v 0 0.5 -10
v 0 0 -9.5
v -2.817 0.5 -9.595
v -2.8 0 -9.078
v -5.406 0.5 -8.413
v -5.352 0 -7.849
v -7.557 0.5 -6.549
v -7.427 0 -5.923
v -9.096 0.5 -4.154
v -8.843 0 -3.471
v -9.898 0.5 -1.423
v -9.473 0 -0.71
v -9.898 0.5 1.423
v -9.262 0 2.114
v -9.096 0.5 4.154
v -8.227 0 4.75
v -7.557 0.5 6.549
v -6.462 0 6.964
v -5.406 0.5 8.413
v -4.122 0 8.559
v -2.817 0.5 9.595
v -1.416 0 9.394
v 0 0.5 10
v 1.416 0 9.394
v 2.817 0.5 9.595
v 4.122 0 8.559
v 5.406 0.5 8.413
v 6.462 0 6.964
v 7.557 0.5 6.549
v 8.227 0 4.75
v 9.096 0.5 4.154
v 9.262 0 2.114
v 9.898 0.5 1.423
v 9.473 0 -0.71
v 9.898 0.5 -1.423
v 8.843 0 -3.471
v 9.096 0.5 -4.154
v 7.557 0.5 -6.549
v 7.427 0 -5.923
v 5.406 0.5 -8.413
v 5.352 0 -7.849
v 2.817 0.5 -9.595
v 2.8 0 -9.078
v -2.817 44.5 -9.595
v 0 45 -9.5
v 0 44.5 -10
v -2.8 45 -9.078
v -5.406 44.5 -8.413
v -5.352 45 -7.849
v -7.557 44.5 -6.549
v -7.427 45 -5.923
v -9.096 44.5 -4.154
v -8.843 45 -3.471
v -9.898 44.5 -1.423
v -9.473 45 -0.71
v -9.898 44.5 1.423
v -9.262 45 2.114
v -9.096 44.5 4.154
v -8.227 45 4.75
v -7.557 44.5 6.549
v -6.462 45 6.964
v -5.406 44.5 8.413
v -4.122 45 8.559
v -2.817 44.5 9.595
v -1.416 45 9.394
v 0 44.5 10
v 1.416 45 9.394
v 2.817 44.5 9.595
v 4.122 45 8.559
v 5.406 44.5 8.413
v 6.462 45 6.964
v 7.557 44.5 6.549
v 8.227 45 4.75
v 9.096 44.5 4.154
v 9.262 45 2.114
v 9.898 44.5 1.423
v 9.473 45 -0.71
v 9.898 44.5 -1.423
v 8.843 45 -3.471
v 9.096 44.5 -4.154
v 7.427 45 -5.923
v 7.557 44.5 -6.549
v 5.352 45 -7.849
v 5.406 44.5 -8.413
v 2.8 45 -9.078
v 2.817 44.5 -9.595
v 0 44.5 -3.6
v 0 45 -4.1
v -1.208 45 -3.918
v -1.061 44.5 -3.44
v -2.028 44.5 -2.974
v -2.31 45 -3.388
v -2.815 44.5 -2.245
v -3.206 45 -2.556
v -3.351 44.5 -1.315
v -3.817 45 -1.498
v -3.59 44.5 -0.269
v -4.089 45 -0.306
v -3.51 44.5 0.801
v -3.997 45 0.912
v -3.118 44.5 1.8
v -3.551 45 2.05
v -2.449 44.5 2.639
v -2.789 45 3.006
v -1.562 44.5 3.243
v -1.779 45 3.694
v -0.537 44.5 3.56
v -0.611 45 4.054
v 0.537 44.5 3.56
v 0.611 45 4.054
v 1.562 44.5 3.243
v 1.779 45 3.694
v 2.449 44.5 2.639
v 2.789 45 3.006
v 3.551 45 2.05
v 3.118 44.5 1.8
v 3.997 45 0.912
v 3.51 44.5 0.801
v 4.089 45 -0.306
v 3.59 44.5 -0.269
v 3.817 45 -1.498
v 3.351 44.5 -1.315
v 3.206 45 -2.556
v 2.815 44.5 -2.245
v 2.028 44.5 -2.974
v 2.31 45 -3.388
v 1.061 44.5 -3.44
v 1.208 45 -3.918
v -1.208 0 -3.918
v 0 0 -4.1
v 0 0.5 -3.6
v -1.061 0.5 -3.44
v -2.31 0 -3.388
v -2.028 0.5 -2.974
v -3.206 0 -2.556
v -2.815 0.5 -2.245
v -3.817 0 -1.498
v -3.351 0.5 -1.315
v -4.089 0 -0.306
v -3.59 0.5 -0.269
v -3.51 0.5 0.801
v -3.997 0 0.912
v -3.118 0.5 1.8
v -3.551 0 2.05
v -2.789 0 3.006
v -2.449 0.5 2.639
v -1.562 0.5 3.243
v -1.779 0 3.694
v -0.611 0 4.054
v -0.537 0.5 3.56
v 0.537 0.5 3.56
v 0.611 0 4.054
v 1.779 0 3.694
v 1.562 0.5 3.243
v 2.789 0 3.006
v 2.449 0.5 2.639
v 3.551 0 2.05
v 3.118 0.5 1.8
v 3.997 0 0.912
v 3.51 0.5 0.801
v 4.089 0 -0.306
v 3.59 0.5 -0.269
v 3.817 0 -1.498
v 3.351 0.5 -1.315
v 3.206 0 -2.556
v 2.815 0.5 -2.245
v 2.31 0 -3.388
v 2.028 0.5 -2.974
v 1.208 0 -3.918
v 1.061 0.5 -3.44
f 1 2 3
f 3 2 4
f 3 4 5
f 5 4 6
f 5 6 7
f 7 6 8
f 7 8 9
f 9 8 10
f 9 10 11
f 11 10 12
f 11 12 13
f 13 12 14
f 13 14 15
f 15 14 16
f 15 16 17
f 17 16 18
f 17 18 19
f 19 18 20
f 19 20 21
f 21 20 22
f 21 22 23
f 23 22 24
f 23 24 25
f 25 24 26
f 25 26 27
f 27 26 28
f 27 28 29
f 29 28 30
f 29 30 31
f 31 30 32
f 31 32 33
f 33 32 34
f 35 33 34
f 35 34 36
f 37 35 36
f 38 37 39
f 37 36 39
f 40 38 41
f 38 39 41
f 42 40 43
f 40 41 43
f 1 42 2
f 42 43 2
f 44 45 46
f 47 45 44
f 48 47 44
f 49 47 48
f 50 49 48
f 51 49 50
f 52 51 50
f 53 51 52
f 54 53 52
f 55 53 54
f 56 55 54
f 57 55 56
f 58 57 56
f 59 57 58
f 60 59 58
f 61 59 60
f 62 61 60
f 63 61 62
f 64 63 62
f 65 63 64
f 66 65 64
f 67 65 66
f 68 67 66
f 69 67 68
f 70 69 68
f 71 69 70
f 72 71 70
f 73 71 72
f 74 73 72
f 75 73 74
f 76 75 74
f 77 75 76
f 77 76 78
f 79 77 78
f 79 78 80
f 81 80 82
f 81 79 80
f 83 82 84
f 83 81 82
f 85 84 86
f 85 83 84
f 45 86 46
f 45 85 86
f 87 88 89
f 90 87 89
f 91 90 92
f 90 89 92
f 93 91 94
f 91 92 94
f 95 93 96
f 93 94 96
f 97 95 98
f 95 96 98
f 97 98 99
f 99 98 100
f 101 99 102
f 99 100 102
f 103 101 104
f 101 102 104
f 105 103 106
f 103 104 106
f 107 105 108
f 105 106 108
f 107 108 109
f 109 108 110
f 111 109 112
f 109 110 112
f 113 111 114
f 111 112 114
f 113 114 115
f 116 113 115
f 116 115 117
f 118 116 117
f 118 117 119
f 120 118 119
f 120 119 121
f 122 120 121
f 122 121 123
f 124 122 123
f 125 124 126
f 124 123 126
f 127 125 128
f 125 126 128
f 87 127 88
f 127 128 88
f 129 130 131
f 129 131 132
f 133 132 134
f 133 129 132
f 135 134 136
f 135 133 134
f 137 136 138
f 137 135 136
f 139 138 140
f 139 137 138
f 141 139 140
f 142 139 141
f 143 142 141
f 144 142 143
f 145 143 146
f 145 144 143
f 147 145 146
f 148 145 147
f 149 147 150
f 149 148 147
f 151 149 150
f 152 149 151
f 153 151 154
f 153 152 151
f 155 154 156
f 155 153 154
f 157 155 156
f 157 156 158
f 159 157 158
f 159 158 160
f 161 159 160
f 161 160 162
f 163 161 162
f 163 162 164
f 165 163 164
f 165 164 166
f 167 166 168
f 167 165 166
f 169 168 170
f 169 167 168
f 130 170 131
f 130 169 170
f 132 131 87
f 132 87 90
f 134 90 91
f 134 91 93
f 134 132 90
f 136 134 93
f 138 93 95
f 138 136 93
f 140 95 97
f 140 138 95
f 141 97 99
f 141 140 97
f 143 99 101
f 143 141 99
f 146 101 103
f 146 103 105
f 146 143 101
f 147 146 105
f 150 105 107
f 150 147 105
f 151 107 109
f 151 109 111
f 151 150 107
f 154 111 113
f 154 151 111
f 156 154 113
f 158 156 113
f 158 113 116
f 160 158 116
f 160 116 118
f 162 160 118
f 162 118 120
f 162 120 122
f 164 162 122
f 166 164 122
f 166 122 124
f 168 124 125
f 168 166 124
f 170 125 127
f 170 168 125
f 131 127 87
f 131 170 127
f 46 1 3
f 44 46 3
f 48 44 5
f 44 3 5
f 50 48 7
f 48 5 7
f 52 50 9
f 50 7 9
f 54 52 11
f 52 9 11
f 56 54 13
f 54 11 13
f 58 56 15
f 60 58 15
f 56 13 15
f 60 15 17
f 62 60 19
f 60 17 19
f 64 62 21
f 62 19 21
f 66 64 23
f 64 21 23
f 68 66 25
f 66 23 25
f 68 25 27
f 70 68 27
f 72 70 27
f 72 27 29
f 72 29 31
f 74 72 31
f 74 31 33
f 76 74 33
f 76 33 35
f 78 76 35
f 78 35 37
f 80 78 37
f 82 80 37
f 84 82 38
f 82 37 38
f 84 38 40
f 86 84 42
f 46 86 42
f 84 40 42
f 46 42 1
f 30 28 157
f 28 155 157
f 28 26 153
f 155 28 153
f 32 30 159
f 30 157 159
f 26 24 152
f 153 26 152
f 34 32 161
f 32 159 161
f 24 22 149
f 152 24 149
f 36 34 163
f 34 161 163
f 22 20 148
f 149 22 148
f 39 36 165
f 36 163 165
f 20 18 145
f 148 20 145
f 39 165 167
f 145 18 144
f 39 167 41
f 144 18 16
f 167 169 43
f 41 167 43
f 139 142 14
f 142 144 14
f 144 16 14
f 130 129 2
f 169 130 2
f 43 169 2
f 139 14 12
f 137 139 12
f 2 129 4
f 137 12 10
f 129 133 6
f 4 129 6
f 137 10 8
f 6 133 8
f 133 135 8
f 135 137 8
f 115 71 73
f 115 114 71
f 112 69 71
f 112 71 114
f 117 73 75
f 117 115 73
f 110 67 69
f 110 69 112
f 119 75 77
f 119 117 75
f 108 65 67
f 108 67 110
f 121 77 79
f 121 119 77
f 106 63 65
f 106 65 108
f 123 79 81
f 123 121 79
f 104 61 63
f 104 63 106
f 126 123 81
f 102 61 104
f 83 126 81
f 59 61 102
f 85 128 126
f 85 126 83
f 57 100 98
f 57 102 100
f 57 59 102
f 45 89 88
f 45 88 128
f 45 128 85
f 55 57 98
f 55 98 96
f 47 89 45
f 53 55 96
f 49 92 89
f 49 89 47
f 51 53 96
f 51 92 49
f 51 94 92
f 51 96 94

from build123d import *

# Parameters (mm, degrees)
SKICA2_R                = 10
SKICA2_R_2              = 3.6
P_IDAT_VYSUNUT_M1_DEPTH = 45
ZKOSEN_1_SIZE           = 0.5


with BuildPart() as part:
    # Skica2 → Přidat vysunutím1 (new body)
    with BuildSketch(Plane(origin=(0, 0, 0), x_dir=(1, 0, 0), z_dir=(0, 1, 0))):
        with Locations(Location((0, 0, 0), (0, 0, 90))):
            Circle(SKICA2_R)
        with Locations(Location((0, 0, 0), (0, 0, 90))):
            Circle(SKICA2_R_2, mode=Mode.SUBTRACT)
    extrude(amount=P_IDAT_VYSUNUT_M1_DEPTH)

    # Zkosení1
    zkosen_1_edges = [part.edges().sort_by_distance(p)[0] for p in [
        (0, 0, 10),
        (0, 45, 10),
        (0, 0, 3.6),
        (0, 45, 3.6),
    ]]
    chamfer(zkosen_1_edges, length=ZKOSEN_1_SIZE)


solid = part.part
